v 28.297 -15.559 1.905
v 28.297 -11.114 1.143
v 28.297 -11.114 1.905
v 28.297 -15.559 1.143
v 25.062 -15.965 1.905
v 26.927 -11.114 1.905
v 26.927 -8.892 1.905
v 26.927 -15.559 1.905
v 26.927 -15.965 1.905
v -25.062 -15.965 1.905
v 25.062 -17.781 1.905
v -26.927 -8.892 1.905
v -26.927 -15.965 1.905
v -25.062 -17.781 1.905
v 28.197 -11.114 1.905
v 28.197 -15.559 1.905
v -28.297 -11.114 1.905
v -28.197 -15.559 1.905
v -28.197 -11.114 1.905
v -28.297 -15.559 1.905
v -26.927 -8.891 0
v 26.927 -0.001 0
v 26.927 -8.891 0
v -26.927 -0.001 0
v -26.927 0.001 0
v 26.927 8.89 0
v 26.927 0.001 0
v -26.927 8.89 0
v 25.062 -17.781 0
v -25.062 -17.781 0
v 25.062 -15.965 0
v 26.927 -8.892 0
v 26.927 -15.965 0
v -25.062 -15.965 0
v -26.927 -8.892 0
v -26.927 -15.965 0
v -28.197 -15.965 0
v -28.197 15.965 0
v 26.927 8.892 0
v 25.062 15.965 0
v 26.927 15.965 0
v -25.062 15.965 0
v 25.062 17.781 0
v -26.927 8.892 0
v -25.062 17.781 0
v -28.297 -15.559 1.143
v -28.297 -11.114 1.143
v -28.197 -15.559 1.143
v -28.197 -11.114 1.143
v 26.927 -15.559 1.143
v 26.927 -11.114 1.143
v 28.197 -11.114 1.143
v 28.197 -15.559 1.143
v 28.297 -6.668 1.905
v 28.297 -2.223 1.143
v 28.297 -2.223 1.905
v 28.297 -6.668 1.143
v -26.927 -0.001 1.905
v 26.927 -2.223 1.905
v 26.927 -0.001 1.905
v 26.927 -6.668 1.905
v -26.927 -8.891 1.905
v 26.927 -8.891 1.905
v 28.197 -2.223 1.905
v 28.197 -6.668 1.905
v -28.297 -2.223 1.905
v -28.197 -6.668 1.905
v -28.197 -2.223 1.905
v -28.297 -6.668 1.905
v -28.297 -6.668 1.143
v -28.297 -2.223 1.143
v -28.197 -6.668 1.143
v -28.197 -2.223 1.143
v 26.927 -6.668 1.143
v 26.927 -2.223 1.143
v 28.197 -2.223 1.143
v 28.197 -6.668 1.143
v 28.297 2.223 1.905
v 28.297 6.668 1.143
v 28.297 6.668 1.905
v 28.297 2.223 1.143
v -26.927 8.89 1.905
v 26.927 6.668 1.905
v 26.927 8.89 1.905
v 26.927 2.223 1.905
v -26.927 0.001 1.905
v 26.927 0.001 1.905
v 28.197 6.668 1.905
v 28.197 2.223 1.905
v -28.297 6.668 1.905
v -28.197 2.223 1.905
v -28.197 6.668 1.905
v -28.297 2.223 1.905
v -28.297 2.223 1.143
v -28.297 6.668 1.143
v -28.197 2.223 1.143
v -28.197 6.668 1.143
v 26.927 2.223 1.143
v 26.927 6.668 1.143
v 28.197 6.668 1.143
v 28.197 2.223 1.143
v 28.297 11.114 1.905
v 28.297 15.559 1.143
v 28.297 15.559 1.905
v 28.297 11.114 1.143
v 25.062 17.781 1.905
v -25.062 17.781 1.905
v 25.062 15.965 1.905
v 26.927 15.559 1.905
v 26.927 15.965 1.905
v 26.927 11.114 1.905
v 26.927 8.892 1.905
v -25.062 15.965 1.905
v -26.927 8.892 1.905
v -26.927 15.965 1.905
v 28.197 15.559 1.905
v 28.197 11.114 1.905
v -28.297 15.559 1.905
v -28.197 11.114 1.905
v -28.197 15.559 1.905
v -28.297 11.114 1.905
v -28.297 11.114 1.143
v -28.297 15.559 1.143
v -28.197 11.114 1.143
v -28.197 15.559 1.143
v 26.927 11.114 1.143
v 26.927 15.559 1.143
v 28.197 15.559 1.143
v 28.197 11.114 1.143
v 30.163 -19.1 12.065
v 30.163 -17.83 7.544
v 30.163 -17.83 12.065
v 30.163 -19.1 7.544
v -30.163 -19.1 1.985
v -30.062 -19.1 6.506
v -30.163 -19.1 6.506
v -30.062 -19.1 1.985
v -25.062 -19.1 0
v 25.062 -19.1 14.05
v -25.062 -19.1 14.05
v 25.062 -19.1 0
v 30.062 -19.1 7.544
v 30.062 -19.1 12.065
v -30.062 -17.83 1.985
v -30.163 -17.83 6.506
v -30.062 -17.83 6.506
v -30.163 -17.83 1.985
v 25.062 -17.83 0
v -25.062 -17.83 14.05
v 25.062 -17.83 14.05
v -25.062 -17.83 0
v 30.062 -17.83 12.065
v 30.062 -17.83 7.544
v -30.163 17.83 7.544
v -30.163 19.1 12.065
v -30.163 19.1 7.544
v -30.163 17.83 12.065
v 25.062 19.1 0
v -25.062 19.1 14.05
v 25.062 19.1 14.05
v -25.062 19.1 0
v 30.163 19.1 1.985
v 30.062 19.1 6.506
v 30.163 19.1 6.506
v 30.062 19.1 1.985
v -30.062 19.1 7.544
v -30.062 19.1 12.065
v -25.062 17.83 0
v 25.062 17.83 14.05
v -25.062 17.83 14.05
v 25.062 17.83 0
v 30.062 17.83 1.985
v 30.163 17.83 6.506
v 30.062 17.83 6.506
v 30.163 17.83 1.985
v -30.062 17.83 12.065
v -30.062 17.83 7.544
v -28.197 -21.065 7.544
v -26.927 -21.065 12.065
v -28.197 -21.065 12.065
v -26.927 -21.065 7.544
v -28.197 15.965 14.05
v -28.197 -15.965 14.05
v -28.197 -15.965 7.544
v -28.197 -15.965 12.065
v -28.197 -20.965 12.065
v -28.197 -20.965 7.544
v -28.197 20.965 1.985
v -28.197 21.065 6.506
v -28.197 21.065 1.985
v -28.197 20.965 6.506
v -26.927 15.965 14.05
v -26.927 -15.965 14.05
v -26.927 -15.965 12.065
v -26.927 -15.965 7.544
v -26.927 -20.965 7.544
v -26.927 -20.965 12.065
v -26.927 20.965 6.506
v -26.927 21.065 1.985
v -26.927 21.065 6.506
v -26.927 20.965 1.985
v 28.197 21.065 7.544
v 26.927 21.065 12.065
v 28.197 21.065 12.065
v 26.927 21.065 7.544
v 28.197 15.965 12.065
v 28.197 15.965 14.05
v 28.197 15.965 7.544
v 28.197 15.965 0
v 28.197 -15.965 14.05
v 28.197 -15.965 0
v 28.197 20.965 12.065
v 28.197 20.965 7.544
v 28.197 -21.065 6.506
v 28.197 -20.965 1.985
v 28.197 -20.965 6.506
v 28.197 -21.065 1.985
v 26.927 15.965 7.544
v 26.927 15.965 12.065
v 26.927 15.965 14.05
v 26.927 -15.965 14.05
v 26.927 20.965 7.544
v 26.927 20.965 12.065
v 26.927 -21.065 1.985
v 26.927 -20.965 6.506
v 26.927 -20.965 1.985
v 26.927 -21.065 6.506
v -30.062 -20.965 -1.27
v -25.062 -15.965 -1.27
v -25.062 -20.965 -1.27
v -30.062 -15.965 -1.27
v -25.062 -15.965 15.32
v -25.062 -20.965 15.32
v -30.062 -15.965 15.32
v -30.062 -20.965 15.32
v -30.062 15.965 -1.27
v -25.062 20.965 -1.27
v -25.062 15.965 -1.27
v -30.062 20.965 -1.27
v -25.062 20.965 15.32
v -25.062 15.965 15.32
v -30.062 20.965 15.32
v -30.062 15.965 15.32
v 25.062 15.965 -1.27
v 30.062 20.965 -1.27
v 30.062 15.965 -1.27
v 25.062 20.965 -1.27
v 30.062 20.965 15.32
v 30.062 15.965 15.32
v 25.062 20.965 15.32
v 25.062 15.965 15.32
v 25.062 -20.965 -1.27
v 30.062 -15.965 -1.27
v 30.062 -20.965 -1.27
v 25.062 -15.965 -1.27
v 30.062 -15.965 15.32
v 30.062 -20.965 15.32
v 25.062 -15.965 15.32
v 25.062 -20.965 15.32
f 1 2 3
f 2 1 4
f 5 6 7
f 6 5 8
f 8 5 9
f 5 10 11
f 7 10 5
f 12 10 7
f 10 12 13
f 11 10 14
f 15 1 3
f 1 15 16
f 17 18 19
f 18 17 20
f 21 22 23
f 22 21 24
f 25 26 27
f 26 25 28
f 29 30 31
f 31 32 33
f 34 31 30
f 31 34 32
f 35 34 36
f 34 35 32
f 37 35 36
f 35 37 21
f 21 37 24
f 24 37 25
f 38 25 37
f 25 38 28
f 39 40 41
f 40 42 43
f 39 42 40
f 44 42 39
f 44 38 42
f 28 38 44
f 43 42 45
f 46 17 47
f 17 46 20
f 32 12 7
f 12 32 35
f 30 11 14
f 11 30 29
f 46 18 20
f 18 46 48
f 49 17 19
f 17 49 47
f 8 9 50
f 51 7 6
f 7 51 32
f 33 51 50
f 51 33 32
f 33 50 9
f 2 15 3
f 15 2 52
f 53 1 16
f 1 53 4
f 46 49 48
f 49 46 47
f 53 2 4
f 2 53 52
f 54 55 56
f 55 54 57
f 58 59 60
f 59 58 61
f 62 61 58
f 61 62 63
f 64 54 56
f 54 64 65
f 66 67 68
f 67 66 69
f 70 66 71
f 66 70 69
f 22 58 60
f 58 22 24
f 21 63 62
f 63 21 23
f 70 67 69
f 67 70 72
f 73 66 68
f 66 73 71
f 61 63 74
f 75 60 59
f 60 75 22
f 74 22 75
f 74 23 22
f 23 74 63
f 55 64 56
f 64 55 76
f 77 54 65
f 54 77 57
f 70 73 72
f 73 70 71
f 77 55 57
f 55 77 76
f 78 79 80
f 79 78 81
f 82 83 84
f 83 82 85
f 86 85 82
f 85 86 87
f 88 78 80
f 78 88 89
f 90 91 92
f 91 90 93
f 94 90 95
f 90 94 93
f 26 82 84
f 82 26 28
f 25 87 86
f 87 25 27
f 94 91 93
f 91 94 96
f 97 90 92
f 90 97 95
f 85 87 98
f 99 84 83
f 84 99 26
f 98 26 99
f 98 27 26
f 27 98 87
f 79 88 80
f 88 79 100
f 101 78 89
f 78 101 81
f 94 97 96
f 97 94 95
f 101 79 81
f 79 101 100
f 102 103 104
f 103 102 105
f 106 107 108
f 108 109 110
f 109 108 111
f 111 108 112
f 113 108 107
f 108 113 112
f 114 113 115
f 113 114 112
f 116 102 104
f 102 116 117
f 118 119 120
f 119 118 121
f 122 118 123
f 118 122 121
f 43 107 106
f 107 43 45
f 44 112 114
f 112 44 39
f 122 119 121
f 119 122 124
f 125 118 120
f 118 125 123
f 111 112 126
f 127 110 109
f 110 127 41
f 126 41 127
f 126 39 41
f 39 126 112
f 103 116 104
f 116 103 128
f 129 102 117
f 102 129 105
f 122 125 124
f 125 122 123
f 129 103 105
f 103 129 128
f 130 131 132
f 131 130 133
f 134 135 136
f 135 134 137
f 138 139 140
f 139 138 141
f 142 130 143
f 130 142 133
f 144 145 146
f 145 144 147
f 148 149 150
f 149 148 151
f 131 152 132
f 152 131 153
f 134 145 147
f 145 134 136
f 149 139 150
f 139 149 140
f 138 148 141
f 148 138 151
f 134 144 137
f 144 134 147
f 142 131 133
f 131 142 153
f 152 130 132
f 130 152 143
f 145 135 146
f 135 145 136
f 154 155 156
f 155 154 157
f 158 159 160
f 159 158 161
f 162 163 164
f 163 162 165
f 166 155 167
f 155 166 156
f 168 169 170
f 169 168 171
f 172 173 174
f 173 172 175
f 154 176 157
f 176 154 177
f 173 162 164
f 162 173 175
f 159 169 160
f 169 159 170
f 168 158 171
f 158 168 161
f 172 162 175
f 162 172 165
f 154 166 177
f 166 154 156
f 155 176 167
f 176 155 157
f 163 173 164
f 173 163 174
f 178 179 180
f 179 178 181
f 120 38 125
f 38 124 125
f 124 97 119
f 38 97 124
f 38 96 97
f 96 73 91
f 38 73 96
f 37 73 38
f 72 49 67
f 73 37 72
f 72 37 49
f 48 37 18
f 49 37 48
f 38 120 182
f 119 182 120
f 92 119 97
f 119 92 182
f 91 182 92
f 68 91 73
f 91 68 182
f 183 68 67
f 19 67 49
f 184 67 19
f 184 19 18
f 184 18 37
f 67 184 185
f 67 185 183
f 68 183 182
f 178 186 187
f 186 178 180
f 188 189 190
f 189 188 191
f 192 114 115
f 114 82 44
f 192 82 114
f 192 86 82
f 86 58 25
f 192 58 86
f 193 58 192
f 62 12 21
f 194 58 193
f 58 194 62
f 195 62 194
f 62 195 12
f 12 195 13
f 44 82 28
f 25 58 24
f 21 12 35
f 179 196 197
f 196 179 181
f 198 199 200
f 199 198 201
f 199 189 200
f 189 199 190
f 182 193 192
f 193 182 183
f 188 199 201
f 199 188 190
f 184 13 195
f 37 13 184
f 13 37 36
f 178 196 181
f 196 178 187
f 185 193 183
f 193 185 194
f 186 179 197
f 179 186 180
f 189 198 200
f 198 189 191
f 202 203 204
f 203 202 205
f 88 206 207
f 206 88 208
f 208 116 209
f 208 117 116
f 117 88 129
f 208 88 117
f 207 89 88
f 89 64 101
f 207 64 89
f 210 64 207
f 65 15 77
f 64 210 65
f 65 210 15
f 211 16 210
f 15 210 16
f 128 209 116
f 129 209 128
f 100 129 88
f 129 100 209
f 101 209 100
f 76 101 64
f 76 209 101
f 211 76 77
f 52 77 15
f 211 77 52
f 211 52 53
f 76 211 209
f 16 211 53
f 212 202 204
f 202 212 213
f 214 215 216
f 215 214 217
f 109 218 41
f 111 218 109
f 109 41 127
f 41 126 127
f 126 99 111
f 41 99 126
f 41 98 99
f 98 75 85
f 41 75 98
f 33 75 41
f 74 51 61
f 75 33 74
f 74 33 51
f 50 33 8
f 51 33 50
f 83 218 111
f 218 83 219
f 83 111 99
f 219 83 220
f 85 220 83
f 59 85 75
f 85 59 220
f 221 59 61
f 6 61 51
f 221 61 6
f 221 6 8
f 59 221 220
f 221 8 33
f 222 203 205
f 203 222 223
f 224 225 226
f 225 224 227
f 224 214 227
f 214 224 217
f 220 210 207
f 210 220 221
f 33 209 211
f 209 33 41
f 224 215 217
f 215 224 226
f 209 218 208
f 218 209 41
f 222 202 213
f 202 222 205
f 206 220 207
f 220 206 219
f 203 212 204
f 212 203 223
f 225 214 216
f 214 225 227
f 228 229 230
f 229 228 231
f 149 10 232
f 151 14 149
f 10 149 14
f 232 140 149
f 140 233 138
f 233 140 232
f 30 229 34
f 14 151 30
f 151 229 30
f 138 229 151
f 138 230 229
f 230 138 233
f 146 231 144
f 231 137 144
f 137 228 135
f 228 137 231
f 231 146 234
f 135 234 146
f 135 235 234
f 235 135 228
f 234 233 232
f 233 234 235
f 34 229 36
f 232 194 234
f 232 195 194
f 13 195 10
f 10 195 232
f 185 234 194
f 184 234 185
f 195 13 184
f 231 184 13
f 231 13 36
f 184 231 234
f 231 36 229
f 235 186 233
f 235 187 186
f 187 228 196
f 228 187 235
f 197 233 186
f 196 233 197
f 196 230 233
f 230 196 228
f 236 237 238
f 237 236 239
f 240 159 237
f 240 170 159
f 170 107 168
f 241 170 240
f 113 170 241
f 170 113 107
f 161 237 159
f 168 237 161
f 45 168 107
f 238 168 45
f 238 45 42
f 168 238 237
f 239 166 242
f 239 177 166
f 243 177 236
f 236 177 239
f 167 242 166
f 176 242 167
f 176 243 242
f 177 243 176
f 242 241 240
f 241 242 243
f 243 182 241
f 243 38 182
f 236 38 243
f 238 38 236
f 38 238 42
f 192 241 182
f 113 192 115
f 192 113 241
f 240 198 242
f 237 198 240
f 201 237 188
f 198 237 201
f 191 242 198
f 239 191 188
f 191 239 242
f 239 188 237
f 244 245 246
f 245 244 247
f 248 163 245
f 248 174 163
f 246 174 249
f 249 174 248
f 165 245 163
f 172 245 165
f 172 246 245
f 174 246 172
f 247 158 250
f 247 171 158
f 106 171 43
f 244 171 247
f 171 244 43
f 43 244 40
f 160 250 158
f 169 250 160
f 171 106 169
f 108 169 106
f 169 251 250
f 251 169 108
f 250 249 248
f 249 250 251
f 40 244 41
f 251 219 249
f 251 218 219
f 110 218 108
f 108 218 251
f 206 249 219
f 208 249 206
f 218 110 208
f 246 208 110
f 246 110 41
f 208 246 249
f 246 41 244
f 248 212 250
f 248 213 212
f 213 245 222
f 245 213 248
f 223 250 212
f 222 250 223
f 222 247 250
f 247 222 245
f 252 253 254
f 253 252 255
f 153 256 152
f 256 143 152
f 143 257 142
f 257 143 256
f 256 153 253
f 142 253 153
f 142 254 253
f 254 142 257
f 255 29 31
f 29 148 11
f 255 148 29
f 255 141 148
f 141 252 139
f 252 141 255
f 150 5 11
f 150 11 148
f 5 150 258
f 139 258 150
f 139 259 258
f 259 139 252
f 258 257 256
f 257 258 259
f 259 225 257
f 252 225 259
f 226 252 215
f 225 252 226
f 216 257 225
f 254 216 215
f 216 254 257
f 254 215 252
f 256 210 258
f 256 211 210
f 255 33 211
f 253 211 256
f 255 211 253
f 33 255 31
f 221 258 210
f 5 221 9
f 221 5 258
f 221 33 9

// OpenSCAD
// file: double_tenon_board.scad
// double_tenon_board.scad

use <board.scad>

module double_tenon_board(size = [10, 5, 1], proportions = [0.15, 0.3, 0.6], paint = "BurlyWood")
{
    // 2nd proportion is the width of the tenon wrt the board width
    // 3rd proportion is the larger offset (smaller offset is implied)
    loffset = (size[1] * proportions[2]);

    tenon_length = (size[0] * proportions[0]);
    tenon_width = (size[1] * proportions[1]);

    small_cutout_size = [
            tenon_length,
            size[1] - loffset - tenon_width,
            size[2]];

    large_cutout_size = [
            tenon_length,
            loffset,
            size[2]];

    color(paint)
        difference()
        {
            board(size = size);
            cube(size = small_cutout_size);

            translate([size[0] - large_cutout_size[0], 0, 0])
                cube(size = large_cutout_size);

            translate([size[0] - small_cutout_size[0], size[1] - small_cutout_size[1], 0])
                cube(size = small_cutout_size);

            translate([0, size[1] - large_cutout_size[1], 0])
                cube(size = large_cutout_size);
        }
}
// file: board.scad
// board.scad

module board(size = [10, 5, 1])
{
    // size[0] is always with the grain
    // size[1] is against the grain
    // size[2] is the board thickness
    cube(size = size, center = false);
}
// file: post_board.scad
// post_board.scad

use <board.scad>

module post_board(size = [10, 2, 2], paint = "Peru")
{
    color(paint)
        rotate([0, 90, 0])
            translate([-size[0], 0, 0])
                cube(size = size);
}
// file: end_board.scad
// end_board.scad

use <double_tenon_board.scad>

module end_board(size = [10, 5, 1], proportions = [0.15, 0.3, 0.6])
{
    rotate([90, 0, -90])
        translate([-size[0], 0, -size[2]])
            double_tenon_board(size = size, proportions = proportions);
}
// file: side_board.scad
// side_board.scad

use <double_tenon_board.scad>

module side_board(size = [10, 5, 1], proportions = [0.15, 0.3, 0.6])
{
    rotate([90, 0, 0])
        translate([0, 0, -size[2]])
            double_tenon_board(size = size, proportions = proportions);
}
// file: base_board.scad
// base_board.scad

use <board.scad>

module base_board(size = [10, 5, 1], proportions = [0.05, 0.5, 0.4], paint = "SaddleBrown")
{
    // 1st proportion is the lenth of the tenon wrt the board width
    // 2nd proportion is the width of the tenon wrt the board width
    // 3rd proportion is the thickness of the tenon wrt the board width
    cutout_size = [
            size[0] * proportions[0],
            size[1]/2 - (size[1]*proportions[1])/2,
            size[2]];

    tenon_cutout_size = [
            cutout_size[0],
            size[1] - (2*cutout_size[1]),
            size[2] - (size[2] * proportions[2])];

    color(paint)
        difference()
        {
            board(size = size);
            cube(size = cutout_size);
            translate([0, size[1] - cutout_size[1], 0])
                cube(size = cutout_size);
            translate([size[0] - cutout_size[0], size[1] - cutout_size[1], 0])
                cube(size = cutout_size);
            translate([size[0] - cutout_size[0], 0, 0])
                cube(size = cutout_size);
            translate([0, cutout_size[1], 0])
                cube(size = tenon_cutout_size);
            translate([size[0] - cutout_size[0], cutout_size[1], 0])
                cube(size = tenon_cutout_size);
        }
}
// main file
// dog_toy_box.scad

use <base_board.scad>
use <side_board.scad>
use <end_board.scad>
use <post_board.scad>

BOARD_OVERRUN = 0.1;

SIDE_BOARD_LENGTH = 60.325;
//SIDE_BOARD_WIDTH = 13.97;
SIDE_BOARD_WIDTH = 14.05;
SIDE_BOARD_DEPTH = 1.27;

TENON_LENGTH = 5.10062;
TENON_WIDTH = 4.52125;
TENON_X1_OFFSET = 1.90495;
TENON_X2_OFFSET = 7.5438;

POST_BOARD_OVERRUN = 1.27;
POST_BOARD_LENGTH = SIDE_BOARD_WIDTH + (2*POST_BOARD_OVERRUN);
POST_BOARD_WIDTH = 5.000625;
POST_BOARD_DEPTH = 5.000625;

NUM_BASE_BOARDS = 4;
BASE_BOARD_LENGTH = SIDE_BOARD_LENGTH - POST_BOARD_WIDTH + SIDE_BOARD_DEPTH;
BASE_BOARD_WIDTH = 8.89;
BASE_BOARD_DEPTH = 1.905;
BASE_BOARD_SEP_DIST = 0.001;
BASE_TOTAL_WIDTH =
        (BASE_BOARD_WIDTH*NUM_BASE_BOARDS)
        + (BASE_BOARD_SEP_DIST * (NUM_BASE_BOARDS-1));

//END_BOARD_LENGTH = BASE_TOTAL_WIDTH + POST_BOARD_WIDTH + SIDE_BOARD_DEPTH;
END_BOARD_LENGTH = 42.1306;
END_BOARD_WIDTH = 14.05;
//END_BOARD_WIDTH = 13.97;
END_BOARD_DEPTH = SIDE_BOARD_DEPTH;

module base()
{
    board_size = [
            BASE_BOARD_LENGTH,
            BASE_BOARD_WIDTH,
            BASE_BOARD_DEPTH];

    proportion = [
            (END_BOARD_DEPTH+BOARD_OVERRUN)/BASE_BOARD_LENGTH,
            0.5,
            0.4];

    translate([-board_size[0]/2, -BASE_TOTAL_WIDTH/2, 0])
        for(b=[0:NUM_BASE_BOARDS-1])
        {
            yoffset = b * (BASE_BOARD_WIDTH+BASE_BOARD_SEP_DIST);
            translate([0, yoffset, 0])
                base_board(board_size, proportion);
        }
}

module sides()
{
    board_size = [
            SIDE_BOARD_LENGTH,
            SIDE_BOARD_WIDTH,
            SIDE_BOARD_DEPTH];

    proportion = [
            (POST_BOARD_WIDTH+BOARD_OVERRUN)/SIDE_BOARD_LENGTH,
            TENON_WIDTH / SIDE_BOARD_WIDTH,
            TENON_X2_OFFSET / SIDE_BOARD_WIDTH];

    //yoffset = (BASE_TOTAL_WIDTH/2 + SIDE_BOARD_DEPTH);
    yoffset = (END_BOARD_LENGTH/2)
            - BOARD_OVERRUN
            - (POST_BOARD_WIDTH/2)
            + (SIDE_BOARD_DEPTH/2);

    rotate([0, 0, 180])
        translate([-board_size[0]/2, -yoffset, 0])
            side_board(board_size, proportion);
    translate([-board_size[0]/2, -yoffset, 0])
        side_board(board_size, proportion);
}

module ends()
{
    xoffset = (BASE_BOARD_LENGTH/2) - BOARD_OVERRUN;

    board_size = [
            END_BOARD_LENGTH,
            END_BOARD_WIDTH,
            END_BOARD_DEPTH];

    proportion = [
            (POST_BOARD_WIDTH+BOARD_OVERRUN)/END_BOARD_LENGTH,
            TENON_WIDTH / END_BOARD_WIDTH,
            TENON_X2_OFFSET / END_BOARD_WIDTH];

    difference()
    {
        translate([-xoffset, -board_size[0]/2, 0])
            end_board(board_size, proportion);
        base();
    }

    difference()
    {
        rotate([0, 0, 180])
            translate([-xoffset, -board_size[0]/2, 0])
                end_board(board_size, proportion);
        base();
    }
}

module single_post()
{
    board_size = [
            POST_BOARD_LENGTH,
            POST_BOARD_WIDTH,
            POST_BOARD_DEPTH];

    corner_offset_a = [
            (SIDE_BOARD_LENGTH/2) - BOARD_OVERRUN,
            (END_BOARD_LENGTH/2) - BOARD_OVERRUN,
            POST_BOARD_OVERRUN];

    translate(corner_offset_a)
        difference()
        {
            translate([-corner_offset_a[0], -corner_offset_a[1], -corner_offset_a[2]])
                post_board(size = board_size);
            sides();
            ends();
            base();
        }
}

module posts()
{
    board_size = [
            POST_BOARD_LENGTH,
            POST_BOARD_WIDTH,
            POST_BOARD_DEPTH];

    corner_offset_a = [
            (SIDE_BOARD_LENGTH/2) - BOARD_OVERRUN,
            END_BOARD_LENGTH/2 - BOARD_OVERRUN,
            POST_BOARD_OVERRUN];

    corner_offset_b = [
            (SIDE_BOARD_LENGTH/2) - BOARD_OVERRUN,
            (-END_BOARD_LENGTH/2) + POST_BOARD_WIDTH + BOARD_OVERRUN,
            POST_BOARD_OVERRUN];

    corner_offset_c = [
            (-SIDE_BOARD_LENGTH/2) + POST_BOARD_WIDTH + BOARD_OVERRUN,
            (-END_BOARD_LENGTH/2) + POST_BOARD_WIDTH + BOARD_OVERRUN,
            POST_BOARD_OVERRUN];

    corner_offset_d = [
            (-SIDE_BOARD_LENGTH/2) + POST_BOARD_WIDTH + BOARD_OVERRUN,
            (END_BOARD_LENGTH/2) - BOARD_OVERRUN,
            POST_BOARD_OVERRUN];

    difference()
    {
        translate([-corner_offset_a[0], -corner_offset_a[1], -corner_offset_a[2]])
            post_board(size = board_size);
        sides();
        ends();
        base();
    }

    difference()
    {
        translate([-corner_offset_a[0], -corner_offset_a[1], -corner_offset_a[2]])
            post_board(size = board_size);
        sides();
        ends();
        base();
    }

    difference()
    {
        translate([-corner_offset_b[0], -corner_offset_b[1], -corner_offset_b[2]])
            post_board(size = board_size);
        sides();
        ends();
        base();
    }

    difference()
    {
        translate([-corner_offset_c[0], -corner_offset_c[1], -corner_offset_c[2]])
            post_board(size = board_size);
        sides();
        ends();
        base();
    }

    difference()
    {
        translate([-corner_offset_d[0], -corner_offset_d[1], -corner_offset_d[2]])
            post_board(size = board_size);
        sides();
        ends();
        base();
    }
}

module dog_toy_box()
{
    base();
    sides();
    ends();
    posts();
}

// results from original model
//
// 'base board' 56.5944 x 8.89 x 1.905
//   - 'tenon xy-offset' = 1.37, 2.5781 (outside edge inward)
//   - 'tenon z-offset' = 0.9525
//   - 'tenon width' = 3.7338
//
// 'side board' 60.325 x 13.97 x 1.27
//   - 'tenon x-offset' = 5.10062
//   - 'tenon large z-offset' = 7.5438
//   - 'tenon small z-offset' = 1.90495
//   - 'tenon width' = 4.52125
//
// 'end board' 42.1306 x 13.97 x 1.27
//   - 'tenon y-offset' = 5.10062
//   - 'tenon large z-offset' = 7.5438
//   - 'tenon small z-offset' = 1.90495
//   - 'tenon width' = 4.52125
//
// 'post board' 16.51 x 5.00063 x 5.00063

dog_toy_box();
